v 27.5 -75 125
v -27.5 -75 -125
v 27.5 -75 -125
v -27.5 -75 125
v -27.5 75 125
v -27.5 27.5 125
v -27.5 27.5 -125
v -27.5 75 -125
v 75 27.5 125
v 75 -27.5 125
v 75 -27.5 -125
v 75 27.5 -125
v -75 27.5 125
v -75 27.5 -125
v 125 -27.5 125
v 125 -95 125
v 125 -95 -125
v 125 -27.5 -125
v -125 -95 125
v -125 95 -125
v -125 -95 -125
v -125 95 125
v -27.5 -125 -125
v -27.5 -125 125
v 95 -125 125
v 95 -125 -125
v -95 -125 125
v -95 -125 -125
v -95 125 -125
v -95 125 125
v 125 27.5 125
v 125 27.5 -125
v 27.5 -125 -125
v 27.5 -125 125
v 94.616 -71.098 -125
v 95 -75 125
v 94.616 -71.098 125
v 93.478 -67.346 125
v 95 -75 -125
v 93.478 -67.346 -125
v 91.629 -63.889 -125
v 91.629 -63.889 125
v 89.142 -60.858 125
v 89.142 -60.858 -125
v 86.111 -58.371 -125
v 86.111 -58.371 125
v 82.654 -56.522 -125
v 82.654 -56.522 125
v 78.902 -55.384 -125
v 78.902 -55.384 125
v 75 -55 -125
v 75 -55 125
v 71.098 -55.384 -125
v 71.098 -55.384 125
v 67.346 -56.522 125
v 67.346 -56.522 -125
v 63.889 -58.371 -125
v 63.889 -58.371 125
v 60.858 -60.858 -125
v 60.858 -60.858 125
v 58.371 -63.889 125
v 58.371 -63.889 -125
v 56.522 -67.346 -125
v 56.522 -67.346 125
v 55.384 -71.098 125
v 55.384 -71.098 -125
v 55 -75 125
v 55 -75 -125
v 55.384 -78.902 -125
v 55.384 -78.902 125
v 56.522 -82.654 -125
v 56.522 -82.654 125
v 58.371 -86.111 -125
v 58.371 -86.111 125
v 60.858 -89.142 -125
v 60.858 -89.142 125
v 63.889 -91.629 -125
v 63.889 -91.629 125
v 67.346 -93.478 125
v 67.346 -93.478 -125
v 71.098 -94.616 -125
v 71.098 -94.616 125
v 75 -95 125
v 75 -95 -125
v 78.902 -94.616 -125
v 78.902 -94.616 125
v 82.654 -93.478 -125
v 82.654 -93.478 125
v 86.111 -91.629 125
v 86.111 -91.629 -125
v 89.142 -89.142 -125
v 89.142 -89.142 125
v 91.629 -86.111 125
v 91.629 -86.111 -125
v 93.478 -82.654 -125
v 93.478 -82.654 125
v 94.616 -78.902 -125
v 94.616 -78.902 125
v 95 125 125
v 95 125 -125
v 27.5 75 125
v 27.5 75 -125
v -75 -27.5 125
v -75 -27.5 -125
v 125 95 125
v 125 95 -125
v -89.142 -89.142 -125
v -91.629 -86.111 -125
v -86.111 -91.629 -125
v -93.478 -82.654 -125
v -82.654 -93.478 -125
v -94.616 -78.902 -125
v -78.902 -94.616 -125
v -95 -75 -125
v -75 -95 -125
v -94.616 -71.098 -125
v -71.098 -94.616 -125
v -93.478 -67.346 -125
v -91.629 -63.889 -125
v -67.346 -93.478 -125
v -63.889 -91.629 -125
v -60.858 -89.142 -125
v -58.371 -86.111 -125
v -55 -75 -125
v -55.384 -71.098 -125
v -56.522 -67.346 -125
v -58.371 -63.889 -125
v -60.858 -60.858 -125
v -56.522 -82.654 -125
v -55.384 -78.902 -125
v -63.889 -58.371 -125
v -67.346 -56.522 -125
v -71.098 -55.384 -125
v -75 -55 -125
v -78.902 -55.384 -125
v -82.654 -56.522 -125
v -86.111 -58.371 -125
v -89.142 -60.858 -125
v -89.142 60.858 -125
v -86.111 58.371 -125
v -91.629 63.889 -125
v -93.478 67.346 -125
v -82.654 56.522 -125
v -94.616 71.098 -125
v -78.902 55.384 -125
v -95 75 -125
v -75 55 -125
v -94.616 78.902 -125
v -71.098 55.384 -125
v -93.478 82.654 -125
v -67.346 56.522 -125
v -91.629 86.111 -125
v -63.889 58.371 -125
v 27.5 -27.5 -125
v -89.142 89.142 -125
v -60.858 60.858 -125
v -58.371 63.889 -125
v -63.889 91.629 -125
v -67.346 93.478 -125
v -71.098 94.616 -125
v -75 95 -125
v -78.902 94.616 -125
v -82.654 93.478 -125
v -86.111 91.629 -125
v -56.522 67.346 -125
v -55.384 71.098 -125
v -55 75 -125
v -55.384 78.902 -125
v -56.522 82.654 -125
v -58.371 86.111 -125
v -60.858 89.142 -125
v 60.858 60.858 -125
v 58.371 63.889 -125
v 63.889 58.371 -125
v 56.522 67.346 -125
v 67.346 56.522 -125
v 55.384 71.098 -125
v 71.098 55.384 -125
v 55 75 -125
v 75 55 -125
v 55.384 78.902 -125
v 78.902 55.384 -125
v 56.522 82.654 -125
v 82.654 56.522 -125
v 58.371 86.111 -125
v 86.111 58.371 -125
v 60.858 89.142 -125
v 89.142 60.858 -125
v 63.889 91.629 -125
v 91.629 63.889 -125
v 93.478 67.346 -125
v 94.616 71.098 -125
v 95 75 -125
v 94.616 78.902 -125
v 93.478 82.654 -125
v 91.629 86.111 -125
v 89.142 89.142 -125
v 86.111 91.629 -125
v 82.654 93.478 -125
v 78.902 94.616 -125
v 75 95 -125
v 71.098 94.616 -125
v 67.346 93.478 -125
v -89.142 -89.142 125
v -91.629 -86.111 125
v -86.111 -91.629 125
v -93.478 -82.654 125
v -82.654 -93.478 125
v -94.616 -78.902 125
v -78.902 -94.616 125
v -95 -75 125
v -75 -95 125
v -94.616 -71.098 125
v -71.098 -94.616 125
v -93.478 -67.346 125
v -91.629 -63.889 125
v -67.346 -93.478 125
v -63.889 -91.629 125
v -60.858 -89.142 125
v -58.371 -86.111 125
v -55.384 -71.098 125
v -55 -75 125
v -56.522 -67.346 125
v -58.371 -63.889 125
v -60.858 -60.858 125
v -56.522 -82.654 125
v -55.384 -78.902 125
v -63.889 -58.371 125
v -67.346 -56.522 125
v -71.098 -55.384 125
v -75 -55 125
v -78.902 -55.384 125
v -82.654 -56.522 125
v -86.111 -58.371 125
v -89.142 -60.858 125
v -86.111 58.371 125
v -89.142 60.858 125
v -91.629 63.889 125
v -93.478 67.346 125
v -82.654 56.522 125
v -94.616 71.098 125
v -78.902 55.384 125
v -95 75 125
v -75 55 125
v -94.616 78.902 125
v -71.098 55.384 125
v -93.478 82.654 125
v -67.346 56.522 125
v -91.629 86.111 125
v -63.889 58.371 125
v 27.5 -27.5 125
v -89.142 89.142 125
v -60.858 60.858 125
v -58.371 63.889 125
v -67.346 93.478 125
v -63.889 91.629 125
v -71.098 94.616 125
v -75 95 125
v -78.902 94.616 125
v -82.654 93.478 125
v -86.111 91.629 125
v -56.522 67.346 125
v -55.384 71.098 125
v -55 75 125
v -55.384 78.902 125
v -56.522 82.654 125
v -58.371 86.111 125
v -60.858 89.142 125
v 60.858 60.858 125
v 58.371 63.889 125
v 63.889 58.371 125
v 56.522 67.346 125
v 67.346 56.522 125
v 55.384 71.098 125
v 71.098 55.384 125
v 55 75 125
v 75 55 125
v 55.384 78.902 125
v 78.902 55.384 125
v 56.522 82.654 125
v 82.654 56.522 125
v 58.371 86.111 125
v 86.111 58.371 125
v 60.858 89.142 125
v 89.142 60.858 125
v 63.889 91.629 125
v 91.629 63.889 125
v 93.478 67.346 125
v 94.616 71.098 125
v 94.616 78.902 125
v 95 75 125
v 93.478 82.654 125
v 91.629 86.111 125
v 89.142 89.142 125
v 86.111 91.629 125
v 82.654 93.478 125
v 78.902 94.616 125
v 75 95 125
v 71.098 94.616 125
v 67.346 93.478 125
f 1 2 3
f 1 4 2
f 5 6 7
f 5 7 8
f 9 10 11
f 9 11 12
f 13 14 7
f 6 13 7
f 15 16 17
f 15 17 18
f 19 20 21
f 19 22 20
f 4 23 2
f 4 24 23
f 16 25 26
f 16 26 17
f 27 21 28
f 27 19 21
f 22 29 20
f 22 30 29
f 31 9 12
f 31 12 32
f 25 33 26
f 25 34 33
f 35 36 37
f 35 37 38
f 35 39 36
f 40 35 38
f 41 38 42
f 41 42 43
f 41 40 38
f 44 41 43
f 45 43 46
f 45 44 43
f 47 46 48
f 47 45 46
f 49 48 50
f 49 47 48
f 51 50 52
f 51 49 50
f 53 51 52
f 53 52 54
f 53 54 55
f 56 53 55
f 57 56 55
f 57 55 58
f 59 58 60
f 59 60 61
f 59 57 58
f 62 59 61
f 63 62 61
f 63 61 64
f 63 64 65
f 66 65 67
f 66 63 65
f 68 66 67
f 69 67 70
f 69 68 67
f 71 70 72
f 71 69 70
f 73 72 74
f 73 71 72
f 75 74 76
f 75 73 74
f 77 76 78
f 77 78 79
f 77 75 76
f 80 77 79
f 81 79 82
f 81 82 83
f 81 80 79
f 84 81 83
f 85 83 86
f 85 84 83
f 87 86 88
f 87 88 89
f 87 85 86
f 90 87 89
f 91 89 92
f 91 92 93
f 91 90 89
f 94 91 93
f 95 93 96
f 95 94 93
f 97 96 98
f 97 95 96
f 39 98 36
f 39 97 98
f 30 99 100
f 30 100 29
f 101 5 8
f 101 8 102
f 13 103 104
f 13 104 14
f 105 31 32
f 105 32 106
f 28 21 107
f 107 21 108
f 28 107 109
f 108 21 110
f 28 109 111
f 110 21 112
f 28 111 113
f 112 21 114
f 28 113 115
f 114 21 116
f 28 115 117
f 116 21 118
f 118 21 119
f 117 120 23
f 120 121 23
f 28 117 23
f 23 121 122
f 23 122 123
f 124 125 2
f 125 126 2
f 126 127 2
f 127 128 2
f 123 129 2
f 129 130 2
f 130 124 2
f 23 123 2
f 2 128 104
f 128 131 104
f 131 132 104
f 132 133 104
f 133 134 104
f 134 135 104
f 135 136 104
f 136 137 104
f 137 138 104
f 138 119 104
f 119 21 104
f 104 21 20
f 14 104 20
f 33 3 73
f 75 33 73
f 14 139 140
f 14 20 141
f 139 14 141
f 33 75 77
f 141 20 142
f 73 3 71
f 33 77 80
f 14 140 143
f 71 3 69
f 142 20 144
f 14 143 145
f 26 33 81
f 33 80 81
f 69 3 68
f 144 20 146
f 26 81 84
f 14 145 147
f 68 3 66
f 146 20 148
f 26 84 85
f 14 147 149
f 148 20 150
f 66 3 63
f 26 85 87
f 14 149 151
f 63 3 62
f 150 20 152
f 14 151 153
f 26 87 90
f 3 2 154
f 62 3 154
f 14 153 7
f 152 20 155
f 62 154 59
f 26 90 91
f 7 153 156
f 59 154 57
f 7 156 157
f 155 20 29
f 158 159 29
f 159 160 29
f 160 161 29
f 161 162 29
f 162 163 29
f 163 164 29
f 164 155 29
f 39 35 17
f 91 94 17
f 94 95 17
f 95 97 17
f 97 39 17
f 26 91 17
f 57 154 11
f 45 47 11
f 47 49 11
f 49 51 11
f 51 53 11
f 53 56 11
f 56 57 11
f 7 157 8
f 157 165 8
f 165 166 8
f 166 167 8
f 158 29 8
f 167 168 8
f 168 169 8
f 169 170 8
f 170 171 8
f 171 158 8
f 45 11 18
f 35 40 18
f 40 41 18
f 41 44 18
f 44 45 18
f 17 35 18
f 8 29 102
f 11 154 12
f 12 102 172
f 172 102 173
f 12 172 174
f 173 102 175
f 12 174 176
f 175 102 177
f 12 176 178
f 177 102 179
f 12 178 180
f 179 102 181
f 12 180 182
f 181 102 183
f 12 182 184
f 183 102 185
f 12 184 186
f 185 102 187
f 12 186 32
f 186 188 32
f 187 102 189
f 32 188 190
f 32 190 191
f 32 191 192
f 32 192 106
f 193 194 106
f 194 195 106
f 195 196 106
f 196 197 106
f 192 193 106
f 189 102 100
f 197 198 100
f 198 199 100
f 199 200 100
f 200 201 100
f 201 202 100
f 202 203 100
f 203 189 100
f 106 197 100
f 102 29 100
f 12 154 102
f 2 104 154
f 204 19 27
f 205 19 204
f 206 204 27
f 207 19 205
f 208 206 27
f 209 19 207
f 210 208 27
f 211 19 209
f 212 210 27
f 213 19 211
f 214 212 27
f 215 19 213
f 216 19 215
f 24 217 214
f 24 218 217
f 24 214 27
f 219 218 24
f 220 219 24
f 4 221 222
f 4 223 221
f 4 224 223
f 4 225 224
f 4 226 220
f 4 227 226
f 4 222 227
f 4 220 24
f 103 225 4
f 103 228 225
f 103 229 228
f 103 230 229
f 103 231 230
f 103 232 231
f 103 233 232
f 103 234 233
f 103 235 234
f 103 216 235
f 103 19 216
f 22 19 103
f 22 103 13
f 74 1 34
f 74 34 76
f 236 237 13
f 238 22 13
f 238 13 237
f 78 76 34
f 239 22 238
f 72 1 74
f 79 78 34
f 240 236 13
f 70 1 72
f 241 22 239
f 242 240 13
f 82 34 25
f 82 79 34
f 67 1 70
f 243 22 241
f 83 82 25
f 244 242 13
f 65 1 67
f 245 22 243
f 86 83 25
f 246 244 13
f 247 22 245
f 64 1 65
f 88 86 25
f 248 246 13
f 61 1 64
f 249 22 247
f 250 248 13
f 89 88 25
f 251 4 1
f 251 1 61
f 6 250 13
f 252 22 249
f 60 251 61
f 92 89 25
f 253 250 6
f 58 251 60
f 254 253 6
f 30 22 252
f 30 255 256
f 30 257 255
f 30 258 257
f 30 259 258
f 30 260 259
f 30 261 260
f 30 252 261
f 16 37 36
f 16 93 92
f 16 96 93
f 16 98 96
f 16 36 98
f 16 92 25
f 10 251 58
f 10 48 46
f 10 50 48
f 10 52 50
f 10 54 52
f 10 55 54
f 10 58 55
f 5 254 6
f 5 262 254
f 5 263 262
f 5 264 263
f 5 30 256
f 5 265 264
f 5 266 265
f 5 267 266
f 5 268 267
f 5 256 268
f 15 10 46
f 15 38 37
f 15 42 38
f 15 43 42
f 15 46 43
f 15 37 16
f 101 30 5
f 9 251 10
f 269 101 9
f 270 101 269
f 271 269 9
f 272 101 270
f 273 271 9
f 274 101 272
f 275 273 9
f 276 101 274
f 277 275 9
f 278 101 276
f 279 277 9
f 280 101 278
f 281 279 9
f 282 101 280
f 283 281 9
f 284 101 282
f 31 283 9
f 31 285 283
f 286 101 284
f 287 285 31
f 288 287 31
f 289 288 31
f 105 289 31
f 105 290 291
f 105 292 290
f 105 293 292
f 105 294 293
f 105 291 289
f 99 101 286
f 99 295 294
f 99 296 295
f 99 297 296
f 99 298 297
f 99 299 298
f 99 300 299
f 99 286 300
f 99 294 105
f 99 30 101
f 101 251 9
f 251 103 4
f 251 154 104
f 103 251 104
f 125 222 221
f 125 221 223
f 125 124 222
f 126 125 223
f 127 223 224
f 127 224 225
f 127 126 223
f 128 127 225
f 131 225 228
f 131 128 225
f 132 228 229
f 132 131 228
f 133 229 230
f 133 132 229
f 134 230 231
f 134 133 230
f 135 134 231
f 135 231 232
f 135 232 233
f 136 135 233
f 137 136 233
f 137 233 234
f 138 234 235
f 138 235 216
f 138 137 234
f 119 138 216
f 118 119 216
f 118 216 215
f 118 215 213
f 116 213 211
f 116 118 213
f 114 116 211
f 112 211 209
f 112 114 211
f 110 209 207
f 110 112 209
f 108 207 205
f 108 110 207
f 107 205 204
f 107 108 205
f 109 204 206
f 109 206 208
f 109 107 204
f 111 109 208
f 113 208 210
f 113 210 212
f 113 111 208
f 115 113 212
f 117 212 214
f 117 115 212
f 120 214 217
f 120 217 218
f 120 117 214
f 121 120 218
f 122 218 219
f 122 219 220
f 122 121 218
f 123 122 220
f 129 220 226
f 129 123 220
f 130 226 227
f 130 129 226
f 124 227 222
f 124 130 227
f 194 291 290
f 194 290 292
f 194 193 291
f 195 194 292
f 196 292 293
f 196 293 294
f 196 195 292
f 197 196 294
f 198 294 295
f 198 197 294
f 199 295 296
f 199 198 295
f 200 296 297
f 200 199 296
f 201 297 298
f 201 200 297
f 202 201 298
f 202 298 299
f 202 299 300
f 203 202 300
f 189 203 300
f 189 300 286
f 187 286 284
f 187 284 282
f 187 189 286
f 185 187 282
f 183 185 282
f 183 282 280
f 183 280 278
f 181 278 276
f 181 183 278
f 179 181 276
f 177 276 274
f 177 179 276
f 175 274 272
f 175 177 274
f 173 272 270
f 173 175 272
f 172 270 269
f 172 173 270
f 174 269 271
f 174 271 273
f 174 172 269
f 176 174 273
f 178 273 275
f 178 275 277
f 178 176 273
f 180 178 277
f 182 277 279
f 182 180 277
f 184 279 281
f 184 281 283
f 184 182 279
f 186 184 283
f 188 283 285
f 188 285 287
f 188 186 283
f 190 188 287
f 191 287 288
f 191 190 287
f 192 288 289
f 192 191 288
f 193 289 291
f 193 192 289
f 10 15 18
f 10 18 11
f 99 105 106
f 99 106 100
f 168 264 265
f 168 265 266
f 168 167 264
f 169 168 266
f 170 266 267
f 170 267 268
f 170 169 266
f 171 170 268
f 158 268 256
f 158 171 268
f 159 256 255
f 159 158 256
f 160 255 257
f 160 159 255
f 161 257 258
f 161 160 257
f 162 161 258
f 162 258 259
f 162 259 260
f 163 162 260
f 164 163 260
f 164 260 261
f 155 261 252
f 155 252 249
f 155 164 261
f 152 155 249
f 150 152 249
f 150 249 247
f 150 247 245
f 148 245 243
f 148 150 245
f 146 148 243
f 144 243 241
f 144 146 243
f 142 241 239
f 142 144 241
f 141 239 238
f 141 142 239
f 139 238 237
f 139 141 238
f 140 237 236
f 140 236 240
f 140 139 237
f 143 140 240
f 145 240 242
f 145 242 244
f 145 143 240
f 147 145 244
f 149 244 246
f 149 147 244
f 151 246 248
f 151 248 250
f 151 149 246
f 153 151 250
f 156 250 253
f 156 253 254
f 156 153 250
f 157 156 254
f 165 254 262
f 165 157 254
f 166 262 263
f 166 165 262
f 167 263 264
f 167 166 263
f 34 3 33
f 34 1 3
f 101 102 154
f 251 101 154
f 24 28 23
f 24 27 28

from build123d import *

# Parameters (mm, degrees)
F0_R     = 20
F1_DEPTH = 125


with BuildPart() as f1:
    # F0 (on Top) → F1 (new body, symmetric)
    with BuildSketch(Plane.XY):
        Polygon((27.5, -125), (95, -125), (125, -95), (125, -27.5), (75, -27.5), (75, 27.5), (125, 27.5), (125, 95), (95, 125), (-95, 125), (-125, 95), (-125, -95), (-95, -125), (-27.5, -125), (-27.5, -75), (27.5, -75), align=None)
        with Locations((-75, -75)):
            Circle(F0_R, mode=Mode.SUBTRACT)
        with Locations((75, -75)):
            Circle(F0_R, mode=Mode.SUBTRACT)
        Polygon((27.5, -27.5), (-75, -27.5), (-75, 27.5), (-27.5, 27.5), (-27.5, 75), (27.5, 75), align=None, mode=Mode.SUBTRACT)
        with Locations((-75, 75)):
            Circle(F0_R, mode=Mode.SUBTRACT)
        with Locations((75, 75)):
            Circle(F0_R, mode=Mode.SUBTRACT)
    extrude(amount=F1_DEPTH, both=True)


solid = f1.part
